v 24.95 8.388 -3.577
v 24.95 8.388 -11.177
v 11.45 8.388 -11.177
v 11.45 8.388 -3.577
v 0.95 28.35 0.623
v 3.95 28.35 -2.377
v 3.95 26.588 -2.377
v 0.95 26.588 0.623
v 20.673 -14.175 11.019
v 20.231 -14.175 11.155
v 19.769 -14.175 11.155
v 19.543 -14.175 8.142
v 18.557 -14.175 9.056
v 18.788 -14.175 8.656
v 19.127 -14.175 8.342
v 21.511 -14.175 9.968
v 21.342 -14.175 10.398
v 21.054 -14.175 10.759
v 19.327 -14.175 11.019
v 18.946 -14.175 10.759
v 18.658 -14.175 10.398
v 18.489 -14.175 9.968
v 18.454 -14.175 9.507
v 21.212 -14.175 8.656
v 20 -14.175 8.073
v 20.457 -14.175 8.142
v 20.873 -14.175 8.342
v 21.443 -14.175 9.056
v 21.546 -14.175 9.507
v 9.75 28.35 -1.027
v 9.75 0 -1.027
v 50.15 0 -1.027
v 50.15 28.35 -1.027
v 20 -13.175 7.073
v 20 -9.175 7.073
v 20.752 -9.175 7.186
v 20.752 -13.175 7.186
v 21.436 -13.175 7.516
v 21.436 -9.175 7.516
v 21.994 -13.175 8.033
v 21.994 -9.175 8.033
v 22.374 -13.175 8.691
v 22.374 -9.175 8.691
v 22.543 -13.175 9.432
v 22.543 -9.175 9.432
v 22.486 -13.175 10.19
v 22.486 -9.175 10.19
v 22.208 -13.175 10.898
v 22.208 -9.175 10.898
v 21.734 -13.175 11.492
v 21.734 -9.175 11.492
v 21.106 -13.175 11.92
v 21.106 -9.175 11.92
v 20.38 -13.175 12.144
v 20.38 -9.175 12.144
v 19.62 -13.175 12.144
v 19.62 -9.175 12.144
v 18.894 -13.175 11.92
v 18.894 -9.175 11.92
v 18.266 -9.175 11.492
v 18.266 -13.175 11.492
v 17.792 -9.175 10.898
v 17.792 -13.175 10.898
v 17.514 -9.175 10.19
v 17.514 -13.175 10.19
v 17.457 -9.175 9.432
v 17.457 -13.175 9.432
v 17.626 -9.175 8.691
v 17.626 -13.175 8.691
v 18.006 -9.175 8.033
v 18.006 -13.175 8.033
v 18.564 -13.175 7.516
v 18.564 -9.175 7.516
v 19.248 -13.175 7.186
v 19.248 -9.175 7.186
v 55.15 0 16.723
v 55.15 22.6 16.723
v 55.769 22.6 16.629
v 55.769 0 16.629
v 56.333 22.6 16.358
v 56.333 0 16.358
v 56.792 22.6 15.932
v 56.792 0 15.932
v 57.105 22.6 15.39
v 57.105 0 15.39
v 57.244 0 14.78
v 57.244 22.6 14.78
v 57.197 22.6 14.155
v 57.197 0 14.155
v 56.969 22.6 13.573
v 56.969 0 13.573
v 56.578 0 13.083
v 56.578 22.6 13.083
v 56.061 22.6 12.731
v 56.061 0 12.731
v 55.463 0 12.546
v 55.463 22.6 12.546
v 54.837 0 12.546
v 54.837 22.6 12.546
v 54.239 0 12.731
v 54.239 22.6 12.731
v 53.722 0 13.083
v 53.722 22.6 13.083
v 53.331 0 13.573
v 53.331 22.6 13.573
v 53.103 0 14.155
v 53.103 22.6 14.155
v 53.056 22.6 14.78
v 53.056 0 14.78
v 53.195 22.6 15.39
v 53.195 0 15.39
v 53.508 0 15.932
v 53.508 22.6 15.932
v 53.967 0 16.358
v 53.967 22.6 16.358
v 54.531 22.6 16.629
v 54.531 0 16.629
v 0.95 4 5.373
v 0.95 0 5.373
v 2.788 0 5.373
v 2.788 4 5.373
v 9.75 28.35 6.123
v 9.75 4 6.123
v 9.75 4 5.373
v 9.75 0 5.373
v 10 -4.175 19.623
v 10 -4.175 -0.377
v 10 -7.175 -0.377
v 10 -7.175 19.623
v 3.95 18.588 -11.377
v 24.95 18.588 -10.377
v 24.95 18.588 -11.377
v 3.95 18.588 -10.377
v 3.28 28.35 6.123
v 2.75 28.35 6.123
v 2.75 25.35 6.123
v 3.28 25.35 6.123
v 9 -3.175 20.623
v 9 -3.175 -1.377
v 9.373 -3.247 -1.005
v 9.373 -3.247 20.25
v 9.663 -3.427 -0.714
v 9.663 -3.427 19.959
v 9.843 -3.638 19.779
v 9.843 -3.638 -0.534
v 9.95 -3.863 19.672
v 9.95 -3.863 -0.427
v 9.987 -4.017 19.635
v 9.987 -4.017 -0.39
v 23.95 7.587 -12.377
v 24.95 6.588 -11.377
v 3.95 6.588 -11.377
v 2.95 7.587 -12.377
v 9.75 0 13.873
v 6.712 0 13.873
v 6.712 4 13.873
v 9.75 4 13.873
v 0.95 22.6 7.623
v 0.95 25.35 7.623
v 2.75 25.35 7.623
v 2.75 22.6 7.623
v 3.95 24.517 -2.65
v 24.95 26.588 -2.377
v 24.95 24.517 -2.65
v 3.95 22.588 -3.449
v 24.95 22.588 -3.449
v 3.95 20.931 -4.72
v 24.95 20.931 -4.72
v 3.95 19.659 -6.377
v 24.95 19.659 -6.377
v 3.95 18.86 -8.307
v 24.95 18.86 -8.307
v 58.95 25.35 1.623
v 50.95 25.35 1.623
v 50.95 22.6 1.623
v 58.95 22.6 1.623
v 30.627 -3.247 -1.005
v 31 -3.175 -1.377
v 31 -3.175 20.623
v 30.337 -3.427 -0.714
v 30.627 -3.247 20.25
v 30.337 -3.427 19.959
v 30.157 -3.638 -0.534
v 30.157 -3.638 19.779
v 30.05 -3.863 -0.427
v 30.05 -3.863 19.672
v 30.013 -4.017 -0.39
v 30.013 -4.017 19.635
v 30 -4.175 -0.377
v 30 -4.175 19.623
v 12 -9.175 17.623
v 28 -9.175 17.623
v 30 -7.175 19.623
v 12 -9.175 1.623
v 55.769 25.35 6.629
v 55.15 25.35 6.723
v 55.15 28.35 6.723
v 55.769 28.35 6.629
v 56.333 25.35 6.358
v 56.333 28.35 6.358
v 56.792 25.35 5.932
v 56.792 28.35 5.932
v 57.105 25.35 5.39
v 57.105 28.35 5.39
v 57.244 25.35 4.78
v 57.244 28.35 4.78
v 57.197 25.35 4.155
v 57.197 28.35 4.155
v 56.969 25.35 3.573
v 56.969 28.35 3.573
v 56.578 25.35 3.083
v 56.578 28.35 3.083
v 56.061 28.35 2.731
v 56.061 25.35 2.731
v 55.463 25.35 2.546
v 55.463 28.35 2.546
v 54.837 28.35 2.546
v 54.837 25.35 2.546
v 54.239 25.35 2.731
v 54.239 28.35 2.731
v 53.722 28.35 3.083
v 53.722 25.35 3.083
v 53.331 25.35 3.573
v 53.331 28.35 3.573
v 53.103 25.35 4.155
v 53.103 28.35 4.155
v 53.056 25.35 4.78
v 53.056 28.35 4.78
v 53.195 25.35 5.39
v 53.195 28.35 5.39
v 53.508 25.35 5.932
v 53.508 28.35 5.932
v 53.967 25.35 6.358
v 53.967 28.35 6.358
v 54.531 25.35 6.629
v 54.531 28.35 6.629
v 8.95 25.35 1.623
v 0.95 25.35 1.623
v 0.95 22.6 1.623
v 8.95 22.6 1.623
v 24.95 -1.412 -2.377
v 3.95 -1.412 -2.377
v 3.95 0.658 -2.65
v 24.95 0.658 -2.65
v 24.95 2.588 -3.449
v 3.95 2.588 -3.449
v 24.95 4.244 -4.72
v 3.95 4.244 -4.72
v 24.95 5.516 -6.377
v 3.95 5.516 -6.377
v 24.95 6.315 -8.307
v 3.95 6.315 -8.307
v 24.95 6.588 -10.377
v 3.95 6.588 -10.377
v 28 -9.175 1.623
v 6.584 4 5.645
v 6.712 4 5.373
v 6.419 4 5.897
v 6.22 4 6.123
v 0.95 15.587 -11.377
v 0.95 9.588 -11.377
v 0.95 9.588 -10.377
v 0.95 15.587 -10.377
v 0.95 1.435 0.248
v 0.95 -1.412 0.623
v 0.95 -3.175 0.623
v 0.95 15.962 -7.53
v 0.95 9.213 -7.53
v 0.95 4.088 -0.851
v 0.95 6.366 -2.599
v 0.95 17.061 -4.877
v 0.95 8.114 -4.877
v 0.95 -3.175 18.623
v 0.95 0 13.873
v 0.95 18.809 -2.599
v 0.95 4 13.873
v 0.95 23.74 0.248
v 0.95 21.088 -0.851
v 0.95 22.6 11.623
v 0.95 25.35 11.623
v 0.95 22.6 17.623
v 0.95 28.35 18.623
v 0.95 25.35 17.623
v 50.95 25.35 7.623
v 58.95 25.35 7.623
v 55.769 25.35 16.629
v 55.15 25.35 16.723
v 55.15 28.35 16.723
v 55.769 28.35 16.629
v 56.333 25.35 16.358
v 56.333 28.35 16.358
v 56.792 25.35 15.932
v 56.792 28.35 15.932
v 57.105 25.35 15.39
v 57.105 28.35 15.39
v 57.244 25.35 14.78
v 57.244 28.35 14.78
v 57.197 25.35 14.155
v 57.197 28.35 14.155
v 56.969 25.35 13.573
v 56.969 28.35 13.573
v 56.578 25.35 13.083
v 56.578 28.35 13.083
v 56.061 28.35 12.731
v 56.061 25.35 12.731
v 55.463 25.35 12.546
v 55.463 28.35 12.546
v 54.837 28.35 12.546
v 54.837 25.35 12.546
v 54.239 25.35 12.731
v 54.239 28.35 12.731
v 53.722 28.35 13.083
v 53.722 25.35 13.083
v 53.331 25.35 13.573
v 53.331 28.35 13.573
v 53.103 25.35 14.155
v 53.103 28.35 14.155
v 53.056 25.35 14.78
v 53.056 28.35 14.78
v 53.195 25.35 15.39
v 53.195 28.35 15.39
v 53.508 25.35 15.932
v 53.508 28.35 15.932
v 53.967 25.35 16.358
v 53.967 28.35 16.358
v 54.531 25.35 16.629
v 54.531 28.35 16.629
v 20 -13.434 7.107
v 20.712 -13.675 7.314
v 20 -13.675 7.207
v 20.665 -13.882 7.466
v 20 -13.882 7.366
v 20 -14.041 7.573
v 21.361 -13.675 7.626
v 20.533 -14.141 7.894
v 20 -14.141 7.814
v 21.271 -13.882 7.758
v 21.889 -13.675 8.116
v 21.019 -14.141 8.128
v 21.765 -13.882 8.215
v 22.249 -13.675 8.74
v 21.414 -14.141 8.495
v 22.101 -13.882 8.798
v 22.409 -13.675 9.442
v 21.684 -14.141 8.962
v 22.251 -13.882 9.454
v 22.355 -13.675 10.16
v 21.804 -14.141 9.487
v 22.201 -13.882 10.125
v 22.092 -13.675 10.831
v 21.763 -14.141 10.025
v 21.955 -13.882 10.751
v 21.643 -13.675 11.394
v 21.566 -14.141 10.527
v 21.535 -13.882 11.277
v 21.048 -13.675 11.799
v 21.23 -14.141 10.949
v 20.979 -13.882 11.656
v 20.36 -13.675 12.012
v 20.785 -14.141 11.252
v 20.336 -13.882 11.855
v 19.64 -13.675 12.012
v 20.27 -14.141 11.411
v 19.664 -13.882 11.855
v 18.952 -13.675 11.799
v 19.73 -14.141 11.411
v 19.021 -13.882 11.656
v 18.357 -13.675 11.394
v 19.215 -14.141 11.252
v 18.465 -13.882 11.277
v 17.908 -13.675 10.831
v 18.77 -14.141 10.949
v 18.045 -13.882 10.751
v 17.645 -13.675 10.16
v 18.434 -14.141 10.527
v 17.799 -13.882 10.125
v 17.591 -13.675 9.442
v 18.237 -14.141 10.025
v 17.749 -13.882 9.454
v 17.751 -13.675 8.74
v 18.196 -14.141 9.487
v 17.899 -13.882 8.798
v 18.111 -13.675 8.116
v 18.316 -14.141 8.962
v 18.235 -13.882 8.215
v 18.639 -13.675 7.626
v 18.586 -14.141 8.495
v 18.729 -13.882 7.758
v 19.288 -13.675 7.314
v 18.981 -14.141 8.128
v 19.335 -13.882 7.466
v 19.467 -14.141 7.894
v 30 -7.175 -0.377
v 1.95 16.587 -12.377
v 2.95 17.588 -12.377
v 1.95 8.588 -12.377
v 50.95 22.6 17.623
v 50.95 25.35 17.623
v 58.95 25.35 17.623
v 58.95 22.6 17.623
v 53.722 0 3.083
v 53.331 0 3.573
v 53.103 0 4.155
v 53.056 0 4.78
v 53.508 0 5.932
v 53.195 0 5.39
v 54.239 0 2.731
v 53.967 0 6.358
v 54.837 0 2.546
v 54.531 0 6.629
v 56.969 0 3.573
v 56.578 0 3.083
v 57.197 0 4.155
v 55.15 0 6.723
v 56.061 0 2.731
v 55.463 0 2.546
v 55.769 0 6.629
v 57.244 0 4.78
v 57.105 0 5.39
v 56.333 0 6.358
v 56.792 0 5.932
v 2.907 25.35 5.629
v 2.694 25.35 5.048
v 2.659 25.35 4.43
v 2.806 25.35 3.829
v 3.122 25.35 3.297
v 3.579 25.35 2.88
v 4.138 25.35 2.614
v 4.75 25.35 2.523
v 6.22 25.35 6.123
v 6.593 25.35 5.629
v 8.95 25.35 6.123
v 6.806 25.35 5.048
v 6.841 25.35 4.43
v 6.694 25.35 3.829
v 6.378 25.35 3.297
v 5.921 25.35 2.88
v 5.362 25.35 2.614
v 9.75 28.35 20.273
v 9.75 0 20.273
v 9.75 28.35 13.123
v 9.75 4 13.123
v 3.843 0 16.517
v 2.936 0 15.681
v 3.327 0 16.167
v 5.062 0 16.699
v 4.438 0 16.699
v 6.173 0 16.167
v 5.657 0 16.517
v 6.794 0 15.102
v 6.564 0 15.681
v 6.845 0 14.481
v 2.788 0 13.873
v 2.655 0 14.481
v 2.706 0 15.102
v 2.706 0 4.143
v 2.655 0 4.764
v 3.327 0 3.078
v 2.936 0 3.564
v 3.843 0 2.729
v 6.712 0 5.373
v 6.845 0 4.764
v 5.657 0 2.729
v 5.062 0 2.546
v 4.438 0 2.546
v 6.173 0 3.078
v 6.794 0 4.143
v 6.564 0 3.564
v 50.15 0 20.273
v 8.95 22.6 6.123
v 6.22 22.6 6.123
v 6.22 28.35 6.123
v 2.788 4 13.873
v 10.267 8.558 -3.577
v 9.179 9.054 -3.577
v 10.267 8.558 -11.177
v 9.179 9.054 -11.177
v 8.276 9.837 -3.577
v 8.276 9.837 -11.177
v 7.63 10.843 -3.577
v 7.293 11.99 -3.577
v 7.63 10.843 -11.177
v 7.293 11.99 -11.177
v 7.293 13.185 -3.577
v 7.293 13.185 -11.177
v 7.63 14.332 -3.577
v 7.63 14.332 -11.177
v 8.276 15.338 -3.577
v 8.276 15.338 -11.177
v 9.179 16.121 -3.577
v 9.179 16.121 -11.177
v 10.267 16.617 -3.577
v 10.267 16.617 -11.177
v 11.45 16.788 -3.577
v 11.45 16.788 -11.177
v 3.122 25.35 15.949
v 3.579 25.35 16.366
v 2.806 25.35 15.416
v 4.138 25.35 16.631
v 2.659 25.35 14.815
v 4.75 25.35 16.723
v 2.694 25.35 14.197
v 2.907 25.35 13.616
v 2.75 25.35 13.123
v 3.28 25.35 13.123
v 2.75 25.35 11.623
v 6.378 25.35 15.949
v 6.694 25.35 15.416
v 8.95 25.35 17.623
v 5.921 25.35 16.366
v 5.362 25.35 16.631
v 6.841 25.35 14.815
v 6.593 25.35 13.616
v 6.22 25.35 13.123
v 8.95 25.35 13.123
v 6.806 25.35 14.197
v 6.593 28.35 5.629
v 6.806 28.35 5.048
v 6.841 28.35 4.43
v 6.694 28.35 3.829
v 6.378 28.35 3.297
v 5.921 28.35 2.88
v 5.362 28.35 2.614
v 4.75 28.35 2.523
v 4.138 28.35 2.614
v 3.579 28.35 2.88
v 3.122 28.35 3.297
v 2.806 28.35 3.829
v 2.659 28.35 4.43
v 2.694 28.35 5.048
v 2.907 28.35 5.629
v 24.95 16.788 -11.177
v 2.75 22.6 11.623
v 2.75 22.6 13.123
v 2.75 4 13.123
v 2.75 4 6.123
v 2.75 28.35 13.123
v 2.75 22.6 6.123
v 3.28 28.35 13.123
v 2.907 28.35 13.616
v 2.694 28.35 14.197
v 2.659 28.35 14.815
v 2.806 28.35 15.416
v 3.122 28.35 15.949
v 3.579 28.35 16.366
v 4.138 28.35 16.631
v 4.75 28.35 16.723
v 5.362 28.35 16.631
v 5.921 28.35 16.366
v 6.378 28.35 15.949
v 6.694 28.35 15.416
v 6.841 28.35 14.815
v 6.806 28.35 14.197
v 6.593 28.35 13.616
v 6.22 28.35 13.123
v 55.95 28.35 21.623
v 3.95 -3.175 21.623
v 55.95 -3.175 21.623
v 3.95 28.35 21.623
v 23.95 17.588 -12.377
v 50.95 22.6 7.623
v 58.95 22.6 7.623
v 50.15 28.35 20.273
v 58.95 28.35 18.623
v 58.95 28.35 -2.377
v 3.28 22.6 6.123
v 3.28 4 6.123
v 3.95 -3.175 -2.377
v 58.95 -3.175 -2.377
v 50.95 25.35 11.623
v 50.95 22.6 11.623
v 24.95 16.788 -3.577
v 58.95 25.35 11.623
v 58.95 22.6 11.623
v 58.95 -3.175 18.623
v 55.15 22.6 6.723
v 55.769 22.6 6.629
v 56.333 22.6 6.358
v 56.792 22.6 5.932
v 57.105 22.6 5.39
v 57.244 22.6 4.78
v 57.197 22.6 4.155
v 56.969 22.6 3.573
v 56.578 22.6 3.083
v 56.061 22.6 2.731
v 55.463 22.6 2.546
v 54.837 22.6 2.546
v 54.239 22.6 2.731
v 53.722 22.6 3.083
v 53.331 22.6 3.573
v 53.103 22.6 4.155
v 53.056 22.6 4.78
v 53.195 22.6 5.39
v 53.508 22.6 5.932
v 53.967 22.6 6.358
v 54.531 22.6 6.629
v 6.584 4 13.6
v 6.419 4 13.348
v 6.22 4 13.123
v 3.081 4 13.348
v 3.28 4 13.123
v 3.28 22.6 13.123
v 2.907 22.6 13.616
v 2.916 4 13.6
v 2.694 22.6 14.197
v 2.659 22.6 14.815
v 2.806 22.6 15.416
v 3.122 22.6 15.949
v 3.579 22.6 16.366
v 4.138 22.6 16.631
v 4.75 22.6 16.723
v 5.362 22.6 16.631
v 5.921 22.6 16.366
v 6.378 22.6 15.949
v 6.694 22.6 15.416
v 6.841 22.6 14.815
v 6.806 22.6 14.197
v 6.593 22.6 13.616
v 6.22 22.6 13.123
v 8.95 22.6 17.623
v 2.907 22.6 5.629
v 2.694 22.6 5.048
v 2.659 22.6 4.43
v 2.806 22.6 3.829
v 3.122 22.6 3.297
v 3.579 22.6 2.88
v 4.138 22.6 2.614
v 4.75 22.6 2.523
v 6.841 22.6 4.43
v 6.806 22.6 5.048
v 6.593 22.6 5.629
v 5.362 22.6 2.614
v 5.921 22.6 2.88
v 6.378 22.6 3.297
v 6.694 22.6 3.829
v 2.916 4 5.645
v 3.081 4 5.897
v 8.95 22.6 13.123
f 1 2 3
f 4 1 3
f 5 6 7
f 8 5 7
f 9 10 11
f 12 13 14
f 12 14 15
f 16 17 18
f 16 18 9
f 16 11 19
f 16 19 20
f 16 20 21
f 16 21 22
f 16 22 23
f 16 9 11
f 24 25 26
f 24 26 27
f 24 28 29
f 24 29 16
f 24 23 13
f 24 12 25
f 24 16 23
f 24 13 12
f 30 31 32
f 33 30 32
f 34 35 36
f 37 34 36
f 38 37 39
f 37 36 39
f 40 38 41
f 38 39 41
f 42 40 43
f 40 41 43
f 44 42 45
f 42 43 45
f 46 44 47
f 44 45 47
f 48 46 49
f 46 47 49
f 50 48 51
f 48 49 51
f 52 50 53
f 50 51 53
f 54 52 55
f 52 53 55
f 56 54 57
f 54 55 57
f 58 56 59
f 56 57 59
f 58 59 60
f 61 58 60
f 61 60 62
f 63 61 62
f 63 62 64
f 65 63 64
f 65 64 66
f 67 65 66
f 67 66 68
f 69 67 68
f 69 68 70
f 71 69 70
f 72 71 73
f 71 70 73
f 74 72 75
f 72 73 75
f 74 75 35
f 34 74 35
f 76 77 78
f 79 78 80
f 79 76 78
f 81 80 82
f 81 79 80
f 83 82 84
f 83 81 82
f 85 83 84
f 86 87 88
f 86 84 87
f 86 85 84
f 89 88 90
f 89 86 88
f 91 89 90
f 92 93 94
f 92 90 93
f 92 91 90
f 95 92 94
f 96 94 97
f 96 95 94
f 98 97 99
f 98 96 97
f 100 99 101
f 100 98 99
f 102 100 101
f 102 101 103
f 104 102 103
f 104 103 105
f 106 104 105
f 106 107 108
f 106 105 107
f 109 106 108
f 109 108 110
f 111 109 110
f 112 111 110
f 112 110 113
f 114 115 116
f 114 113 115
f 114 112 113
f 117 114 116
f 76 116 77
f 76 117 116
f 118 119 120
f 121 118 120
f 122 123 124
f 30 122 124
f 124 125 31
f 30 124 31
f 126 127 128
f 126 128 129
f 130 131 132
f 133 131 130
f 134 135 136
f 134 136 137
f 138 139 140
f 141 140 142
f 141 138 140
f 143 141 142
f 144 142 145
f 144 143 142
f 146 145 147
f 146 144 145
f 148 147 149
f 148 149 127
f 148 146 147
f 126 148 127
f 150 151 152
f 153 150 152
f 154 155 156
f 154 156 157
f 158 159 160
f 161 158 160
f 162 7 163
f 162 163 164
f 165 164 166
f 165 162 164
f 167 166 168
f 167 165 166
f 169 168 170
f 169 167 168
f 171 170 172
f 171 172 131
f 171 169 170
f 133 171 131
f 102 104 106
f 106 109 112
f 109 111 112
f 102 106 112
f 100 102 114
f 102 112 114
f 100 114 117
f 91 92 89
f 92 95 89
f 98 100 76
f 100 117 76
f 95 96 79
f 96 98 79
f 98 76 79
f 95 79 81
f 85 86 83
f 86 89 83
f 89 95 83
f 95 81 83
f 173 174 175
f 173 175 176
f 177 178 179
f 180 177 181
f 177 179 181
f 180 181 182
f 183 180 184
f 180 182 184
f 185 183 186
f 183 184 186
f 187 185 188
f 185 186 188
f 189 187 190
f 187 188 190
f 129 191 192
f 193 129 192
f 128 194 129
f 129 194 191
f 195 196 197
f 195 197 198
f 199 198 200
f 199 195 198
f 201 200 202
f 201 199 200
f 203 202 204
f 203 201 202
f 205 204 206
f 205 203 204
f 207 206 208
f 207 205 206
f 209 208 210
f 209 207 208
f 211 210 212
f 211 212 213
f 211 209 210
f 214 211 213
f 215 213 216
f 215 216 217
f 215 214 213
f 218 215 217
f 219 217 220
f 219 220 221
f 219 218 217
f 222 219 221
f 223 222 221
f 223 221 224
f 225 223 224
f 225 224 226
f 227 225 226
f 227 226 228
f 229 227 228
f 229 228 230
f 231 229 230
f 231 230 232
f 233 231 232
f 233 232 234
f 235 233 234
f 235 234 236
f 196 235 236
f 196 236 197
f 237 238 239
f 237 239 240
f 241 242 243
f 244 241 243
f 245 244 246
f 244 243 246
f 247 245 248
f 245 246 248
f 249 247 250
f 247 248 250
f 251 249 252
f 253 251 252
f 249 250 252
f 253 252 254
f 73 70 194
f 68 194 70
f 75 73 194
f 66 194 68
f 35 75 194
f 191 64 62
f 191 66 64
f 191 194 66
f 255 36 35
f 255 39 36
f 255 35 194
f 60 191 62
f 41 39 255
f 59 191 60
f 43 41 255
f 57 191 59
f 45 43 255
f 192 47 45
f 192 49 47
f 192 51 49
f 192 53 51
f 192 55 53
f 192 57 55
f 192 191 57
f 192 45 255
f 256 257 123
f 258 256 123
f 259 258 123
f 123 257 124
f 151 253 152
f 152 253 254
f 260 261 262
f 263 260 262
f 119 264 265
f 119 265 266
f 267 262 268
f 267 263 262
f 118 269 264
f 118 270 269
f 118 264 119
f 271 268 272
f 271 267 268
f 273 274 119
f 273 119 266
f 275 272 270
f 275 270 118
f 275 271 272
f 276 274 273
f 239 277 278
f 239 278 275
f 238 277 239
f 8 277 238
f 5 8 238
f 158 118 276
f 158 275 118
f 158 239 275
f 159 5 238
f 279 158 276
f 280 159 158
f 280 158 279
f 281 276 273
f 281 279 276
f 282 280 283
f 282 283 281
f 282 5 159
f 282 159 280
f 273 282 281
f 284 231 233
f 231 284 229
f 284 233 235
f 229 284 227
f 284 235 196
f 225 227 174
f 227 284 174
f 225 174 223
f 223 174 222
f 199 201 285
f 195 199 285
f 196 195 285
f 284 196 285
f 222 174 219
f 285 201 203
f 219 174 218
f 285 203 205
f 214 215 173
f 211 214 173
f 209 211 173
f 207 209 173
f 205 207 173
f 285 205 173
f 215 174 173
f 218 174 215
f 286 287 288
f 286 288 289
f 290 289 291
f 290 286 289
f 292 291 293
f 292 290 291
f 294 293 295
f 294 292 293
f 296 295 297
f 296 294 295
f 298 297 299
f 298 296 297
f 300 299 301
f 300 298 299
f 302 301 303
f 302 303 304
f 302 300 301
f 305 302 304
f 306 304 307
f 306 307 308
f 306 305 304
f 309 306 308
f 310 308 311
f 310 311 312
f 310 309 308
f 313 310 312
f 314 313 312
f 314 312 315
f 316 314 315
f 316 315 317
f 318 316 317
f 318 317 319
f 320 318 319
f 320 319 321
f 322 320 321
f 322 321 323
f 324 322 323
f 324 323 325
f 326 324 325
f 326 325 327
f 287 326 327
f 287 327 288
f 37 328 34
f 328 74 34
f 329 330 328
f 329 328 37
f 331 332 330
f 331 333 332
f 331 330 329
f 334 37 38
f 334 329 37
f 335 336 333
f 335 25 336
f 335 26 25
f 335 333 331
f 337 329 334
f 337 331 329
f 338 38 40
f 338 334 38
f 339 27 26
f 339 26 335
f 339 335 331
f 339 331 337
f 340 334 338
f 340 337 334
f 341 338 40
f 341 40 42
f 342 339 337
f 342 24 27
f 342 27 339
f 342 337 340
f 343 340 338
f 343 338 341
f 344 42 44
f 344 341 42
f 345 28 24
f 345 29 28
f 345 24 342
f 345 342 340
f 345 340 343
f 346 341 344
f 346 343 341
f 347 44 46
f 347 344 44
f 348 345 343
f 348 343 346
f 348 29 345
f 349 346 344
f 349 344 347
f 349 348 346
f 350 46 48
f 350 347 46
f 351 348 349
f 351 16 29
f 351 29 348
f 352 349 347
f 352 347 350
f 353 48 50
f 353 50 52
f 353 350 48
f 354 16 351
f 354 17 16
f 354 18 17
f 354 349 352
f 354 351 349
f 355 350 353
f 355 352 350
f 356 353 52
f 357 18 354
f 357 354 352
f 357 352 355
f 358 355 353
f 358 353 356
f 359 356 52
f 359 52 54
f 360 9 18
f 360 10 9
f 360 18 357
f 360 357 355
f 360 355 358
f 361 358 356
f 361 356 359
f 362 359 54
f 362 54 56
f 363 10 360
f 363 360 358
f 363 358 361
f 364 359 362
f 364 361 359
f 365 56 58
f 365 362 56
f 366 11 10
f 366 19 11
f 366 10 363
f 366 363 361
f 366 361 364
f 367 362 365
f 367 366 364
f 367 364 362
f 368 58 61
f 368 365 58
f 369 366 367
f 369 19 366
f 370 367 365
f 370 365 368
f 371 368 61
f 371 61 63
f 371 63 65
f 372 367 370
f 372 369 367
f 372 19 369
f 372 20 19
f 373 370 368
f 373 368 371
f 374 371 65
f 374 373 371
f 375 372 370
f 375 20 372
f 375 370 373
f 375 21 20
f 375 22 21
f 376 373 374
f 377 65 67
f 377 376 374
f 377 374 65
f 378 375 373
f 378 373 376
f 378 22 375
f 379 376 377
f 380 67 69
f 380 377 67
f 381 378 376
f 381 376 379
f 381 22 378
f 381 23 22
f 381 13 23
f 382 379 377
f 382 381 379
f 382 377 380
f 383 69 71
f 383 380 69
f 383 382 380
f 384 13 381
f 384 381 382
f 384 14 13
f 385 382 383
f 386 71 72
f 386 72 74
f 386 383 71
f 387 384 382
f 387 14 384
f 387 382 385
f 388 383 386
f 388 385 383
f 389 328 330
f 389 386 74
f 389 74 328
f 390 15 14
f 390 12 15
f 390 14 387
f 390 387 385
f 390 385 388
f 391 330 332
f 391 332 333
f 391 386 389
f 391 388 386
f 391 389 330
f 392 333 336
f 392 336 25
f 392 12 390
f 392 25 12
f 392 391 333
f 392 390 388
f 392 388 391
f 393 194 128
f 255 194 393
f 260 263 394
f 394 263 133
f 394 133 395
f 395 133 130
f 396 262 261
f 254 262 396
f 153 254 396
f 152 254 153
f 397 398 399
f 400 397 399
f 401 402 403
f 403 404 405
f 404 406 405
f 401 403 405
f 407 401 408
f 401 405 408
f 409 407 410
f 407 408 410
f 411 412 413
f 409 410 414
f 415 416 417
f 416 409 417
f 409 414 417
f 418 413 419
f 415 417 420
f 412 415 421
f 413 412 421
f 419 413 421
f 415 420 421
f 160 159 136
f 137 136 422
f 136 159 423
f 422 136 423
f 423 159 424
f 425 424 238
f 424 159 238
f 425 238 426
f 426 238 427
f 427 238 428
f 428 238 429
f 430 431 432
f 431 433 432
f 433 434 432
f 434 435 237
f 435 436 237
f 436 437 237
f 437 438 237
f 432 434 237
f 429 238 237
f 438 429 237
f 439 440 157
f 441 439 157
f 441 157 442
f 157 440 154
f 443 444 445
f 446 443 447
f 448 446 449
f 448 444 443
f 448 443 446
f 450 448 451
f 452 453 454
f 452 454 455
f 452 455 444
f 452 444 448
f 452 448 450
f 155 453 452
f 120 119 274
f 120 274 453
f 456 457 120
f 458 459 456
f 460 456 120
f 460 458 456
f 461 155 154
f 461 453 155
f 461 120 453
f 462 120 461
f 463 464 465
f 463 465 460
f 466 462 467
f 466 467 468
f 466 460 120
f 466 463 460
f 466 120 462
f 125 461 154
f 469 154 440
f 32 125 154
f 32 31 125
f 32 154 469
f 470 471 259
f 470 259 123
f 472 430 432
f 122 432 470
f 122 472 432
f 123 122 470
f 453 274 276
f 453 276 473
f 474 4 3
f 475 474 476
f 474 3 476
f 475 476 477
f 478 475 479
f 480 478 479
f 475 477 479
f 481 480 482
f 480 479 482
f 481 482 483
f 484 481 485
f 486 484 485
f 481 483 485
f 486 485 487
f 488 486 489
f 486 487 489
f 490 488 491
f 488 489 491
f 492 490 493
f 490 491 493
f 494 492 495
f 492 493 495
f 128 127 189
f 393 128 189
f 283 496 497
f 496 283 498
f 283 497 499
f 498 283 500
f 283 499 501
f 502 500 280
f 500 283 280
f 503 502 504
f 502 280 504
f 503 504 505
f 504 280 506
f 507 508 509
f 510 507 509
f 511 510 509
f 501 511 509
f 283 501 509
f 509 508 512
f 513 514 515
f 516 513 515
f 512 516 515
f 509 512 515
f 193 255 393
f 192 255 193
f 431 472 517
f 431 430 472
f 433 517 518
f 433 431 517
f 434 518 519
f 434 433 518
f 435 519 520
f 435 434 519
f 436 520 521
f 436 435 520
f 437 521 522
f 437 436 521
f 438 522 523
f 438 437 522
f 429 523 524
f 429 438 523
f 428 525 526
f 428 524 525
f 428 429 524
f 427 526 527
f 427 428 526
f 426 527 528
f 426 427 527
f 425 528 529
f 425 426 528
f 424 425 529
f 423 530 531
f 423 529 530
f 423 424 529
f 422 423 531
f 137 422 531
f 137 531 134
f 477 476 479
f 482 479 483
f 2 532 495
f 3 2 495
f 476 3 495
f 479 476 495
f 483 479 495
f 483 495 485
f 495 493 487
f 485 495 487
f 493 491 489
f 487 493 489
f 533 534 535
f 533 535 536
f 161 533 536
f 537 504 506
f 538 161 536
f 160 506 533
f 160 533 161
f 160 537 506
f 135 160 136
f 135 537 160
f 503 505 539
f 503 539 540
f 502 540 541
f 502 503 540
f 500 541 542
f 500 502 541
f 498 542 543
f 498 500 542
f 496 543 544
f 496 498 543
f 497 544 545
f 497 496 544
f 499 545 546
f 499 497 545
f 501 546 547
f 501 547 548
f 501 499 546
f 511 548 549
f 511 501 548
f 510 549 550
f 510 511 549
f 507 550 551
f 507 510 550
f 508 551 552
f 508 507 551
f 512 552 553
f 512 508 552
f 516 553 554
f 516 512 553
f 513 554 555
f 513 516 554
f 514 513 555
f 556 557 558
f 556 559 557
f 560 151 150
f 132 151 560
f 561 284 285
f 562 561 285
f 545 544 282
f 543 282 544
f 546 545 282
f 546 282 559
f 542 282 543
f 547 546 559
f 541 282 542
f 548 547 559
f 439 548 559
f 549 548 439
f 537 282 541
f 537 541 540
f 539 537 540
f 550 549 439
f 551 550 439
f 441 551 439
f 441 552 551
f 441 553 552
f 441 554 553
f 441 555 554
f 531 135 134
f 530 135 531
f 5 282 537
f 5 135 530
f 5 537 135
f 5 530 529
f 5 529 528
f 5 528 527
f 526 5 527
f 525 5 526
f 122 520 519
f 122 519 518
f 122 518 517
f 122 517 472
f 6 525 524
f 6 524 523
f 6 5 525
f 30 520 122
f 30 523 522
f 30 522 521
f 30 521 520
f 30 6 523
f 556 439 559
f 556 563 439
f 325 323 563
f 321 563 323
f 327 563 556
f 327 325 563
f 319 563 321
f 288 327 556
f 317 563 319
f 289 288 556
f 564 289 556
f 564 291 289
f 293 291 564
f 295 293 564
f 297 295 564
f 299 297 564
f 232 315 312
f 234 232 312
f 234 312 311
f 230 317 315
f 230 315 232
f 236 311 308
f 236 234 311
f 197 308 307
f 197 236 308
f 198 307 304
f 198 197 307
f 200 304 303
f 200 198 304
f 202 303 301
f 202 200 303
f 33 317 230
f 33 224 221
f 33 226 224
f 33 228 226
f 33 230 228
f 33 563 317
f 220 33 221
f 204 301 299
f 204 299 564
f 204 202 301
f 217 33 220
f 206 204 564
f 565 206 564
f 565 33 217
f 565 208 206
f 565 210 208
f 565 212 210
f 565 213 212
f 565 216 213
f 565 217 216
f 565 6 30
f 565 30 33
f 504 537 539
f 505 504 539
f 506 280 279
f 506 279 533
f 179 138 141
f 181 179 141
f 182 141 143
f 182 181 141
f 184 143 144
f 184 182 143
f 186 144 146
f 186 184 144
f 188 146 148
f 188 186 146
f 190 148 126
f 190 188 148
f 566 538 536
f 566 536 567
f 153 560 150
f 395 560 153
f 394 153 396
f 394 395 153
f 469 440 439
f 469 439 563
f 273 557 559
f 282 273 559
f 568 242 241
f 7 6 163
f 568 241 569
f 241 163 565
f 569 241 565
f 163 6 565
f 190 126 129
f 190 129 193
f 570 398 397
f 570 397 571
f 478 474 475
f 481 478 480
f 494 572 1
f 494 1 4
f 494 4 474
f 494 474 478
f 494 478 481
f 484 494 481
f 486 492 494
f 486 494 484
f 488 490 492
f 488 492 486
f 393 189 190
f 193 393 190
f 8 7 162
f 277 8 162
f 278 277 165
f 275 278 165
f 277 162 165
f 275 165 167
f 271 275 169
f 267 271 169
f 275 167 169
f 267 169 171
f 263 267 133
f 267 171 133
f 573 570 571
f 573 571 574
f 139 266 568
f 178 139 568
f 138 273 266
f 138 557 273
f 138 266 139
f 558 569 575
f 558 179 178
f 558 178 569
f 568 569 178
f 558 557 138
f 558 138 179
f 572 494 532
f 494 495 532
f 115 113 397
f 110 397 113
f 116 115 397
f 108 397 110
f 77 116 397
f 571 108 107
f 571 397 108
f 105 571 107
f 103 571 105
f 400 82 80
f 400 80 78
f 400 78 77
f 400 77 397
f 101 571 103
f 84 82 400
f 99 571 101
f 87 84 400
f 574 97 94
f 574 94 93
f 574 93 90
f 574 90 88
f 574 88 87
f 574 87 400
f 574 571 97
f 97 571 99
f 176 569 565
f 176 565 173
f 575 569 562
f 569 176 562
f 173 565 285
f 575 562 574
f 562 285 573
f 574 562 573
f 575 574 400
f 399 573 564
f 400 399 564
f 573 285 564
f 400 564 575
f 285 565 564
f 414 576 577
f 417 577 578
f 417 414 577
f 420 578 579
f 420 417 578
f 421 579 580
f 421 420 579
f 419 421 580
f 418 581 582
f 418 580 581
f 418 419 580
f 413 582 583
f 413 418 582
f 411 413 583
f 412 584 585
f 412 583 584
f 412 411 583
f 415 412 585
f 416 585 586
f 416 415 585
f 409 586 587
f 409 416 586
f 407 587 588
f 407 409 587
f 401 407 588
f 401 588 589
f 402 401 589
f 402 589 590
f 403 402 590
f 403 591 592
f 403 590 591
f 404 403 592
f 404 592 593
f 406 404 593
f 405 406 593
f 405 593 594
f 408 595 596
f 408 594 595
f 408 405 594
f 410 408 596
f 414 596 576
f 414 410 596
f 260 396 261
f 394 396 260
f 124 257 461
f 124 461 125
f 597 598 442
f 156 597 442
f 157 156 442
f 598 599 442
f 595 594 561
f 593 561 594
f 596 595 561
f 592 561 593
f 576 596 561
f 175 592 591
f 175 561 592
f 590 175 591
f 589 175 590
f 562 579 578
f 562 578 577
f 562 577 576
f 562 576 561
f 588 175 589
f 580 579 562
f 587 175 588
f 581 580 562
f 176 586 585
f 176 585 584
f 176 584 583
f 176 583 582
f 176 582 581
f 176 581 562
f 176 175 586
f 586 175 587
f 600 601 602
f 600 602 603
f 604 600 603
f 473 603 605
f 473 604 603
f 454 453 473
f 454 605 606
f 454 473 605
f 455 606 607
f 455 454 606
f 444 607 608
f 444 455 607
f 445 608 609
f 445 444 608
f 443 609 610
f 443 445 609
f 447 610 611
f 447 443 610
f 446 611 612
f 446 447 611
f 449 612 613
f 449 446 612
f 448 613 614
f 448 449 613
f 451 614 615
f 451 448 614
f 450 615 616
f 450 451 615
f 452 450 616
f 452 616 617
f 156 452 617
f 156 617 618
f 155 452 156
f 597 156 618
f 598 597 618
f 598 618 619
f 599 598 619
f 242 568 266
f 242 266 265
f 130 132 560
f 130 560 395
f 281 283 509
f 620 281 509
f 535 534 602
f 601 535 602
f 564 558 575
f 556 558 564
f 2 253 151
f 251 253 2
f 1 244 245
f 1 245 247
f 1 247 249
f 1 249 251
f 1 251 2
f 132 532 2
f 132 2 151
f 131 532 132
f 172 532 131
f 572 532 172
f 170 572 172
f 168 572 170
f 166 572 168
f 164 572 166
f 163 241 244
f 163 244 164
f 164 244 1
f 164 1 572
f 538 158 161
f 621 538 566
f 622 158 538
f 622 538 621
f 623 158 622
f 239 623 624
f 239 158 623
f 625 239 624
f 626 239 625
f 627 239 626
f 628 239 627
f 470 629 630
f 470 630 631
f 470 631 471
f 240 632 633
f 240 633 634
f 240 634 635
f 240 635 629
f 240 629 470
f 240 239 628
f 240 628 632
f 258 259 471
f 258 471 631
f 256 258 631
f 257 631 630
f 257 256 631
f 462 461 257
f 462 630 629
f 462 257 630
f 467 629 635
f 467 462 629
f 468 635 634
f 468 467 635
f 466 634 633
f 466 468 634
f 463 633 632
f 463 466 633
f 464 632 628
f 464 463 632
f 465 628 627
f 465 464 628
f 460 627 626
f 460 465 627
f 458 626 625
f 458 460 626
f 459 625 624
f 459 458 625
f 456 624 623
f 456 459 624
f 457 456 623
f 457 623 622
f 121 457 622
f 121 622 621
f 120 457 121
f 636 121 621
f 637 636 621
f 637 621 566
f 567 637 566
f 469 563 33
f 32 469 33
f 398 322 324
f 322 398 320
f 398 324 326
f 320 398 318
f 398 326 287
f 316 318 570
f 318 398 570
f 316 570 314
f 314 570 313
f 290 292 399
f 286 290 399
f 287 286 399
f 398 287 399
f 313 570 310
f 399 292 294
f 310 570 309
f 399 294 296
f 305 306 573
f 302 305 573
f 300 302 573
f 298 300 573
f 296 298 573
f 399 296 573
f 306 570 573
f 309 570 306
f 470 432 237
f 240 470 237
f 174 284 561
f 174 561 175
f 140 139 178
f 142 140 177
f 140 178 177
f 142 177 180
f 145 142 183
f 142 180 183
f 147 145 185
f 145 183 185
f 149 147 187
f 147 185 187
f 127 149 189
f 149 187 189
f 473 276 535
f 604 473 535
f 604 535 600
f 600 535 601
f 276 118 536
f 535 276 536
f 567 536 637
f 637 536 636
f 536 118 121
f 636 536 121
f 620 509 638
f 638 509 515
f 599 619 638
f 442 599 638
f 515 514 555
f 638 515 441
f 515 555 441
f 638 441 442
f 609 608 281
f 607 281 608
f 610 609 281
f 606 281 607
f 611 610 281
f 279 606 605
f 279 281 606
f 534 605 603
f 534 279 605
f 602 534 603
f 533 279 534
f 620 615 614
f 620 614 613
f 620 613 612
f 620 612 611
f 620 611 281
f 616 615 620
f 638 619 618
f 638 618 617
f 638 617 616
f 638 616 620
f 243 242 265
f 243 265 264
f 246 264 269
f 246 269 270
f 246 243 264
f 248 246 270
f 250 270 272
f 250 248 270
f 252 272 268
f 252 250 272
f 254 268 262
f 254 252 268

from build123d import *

# Parameters (mm, degrees)
SKETCH1_W           = 58
SKETCH1_H           = 24
SKETCH1_R           = 2.1
SKETCH1_W_2         = 40.4
SKETCH1_H_2         = 21.3
BOSS_EXTRUDE1_DEPTH = 28.35
SKETCH11_W          = 58
SKETCH11_H          = 24
BOSS_EXTRUDE5_DEPTH = 3.175
SKETCH14_W          = 24
SKETCH14_H          = 12
BOSS_EXTRUDE7_DEPTH = 10
CUT_EXTRUDE1_DEPTH  = 3.8
FILLET1_R           = 8
CHAMFER2_SIZE       = 3
CHAMFER3_SIZE       = 1
SKETCH19_W          = 8
SKETCH19_H          = 6
CUT_EXTRUDE3_DEPTH  = 2.75
SKETCH20_W          = 8.8
SKETCH20_H          = 8.5
CUT_EXTRUDE4_DEPTH  = 4
SKETCH21_W          = 20
SKETCH21_H          = 20
BOSS_EXTRUDE8_DEPTH = 6
SKETCH13_R          = 2.55
BOSS_EXTRUDE6_DEPTH = 5
FILLET4_R           = 1
CHAMFER4_SIZE       = 2
FILLET5_R           = 1
CUT_EXTRUDE5_REACH  = 77.835
SKETCH22_W          = 7
SKETCH22_H          = 7


with BuildPart() as part:
    # Sketch1 → Boss-Extrude1 (new body)
    with BuildSketch(Plane(origin=(0, 0, 0), x_dir=(1, 0, 0), z_dir=(0, 1, 0))):
        with Locations((29.95, -9.622651473)):
            Rectangle(SKETCH1_W, SKETCH1_H)
        with Locations(Location((55.15, -4.622651473, 0), (0, 0, 270))):
            Circle(SKETCH1_R, mode=Mode.SUBTRACT)
        with Locations(Location((55.15, -14.622651473, 0), (0, 0, 270))):
            Circle(SKETCH1_R, mode=Mode.SUBTRACT)
        with Locations(Location((4.75, -14.622651473, 0), (0, 0, 90))):
            Circle(SKETCH1_R, mode=Mode.SUBTRACT)
        with Locations(Location((4.75, -4.622651473, 0), (0, 0, 90))):
            Circle(SKETCH1_R, mode=Mode.SUBTRACT)
        with Locations((29.95, -9.622651473)):
            Rectangle(SKETCH1_W_2, SKETCH1_H_2, mode=Mode.SUBTRACT)
    extrude(amount=BOSS_EXTRUDE1_DEPTH)

    # Sketch11 → Boss-Extrude5 (add)
    with BuildSketch(Plane.XZ):
        with Locations((29.95, 9.622651473)):
            Rectangle(SKETCH11_W, SKETCH11_H)
    extrude(amount=BOSS_EXTRUDE5_DEPTH)

    # Sketch14 → Boss-Extrude7 (add)
    with BuildSketch(Plane(origin=(0, 0, -2.377348527), x_dir=(-1, 0, 0), z_dir=(0, 0, -1))):
        with Locations((-12.95, 12.5875)):
            Rectangle(SKETCH14_W, SKETCH14_H)
    extrude(amount=BOSS_EXTRUDE7_DEPTH)

    # Sketch16 → Cut-Extrude1 (cut, symmetric)
    with BuildSketch(Plane(origin=(0, 0, -7.377348527), x_dir=(-1, 0, 0), z_dir=(0, 0, -1))):
        with BuildLine():
            Line((-11.45, 16.7875), (-24.95, 16.7875))
            Line((-24.95, 16.7875), (-24.95, 8.3875))
            Line((-24.95, 8.3875), (-11.45, 8.3875))
            ThreePointArc((-11.45, 8.3875), (-7.25, 12.5875), (-11.45, 16.7875))
        make_face()
    extrude(amount=CUT_EXTRUDE1_DEPTH, both=True, mode=Mode.SUBTRACT)

    # Fillet1
    fillet1_edges = [part.edges().sort_by_distance(p)[0] for p in [
        (12.95, 6.5875, -2.377348527),
        (12.95, 18.5875, -2.377348527),
    ]]
    fillet(fillet1_edges, radius=FILLET1_R)

    # Chamfer2
    chamfer2_edges = [part.edges().sort_by_distance(p)[0] for p in [
        (0.95, 6.5875, -11.377348527),
        (0.95, 18.5875, -11.377348527),
        (58.95, 12.5875, 21.622651473),
        (0.95, 12.5875, 21.622651473),
        (0.95, 27.46875, -2.377348527),
        (0.95, -2.29375, -2.377348527),
        (0.95, 4.244354249, -4.720494277),
        (0.95, 20.930645751, -4.720494277),
    ]]
    chamfer(chamfer2_edges, length=CHAMFER2_SIZE)

    # Chamfer3
    chamfer3_edges = [part.edges().sort_by_distance(p)[0] for p in [
        (0.95, 12.5875, -12.377348527),
        (14.45, 18.5875, -12.377348527),
        (24.95, 12.5875, -12.377348527),
        (14.45, 6.5875, -12.377348527),
    ]]
    chamfer(chamfer3_edges, length=CHAMFER3_SIZE)

    # Sketch19 → Cut-Extrude3 (cut)
    with BuildSketch(Plane(origin=(0, 25.35, 0), x_dir=(1, 0, 0), z_dir=(0, 1, 0))):
        with Locations((4.95, -4.622651473)):
            Rectangle(SKETCH19_W, SKETCH19_H)
        with Locations((4.95, -14.622651473)):
            Rectangle(SKETCH19_W, SKETCH19_H)
        with Locations((54.95, -14.622651473)):
            Rectangle(SKETCH19_W, SKETCH19_H)
        with Locations((54.95, -4.622651473)):
            Rectangle(SKETCH19_W, SKETCH19_H)
    extrude(amount=-CUT_EXTRUDE3_DEPTH, mode=Mode.SUBTRACT)

    # Sketch20 → Cut-Extrude4 (cut)
    with BuildSketch(Plane(origin=(0, 0, 0), x_dir=(1, 0, 0), z_dir=(0, 1, 0))):
        with Locations((5.35, -9.622651473)):
            Rectangle(SKETCH20_W, SKETCH20_H)
    extrude(amount=CUT_EXTRUDE4_DEPTH, mode=Mode.SUBTRACT)

    # Sketch21 → Boss-Extrude8 (add)
    with BuildSketch(Plane.XZ.offset(3.175)):
        with Locations((20, 9.622651473)):
            Rectangle(SKETCH21_W, SKETCH21_H)
    extrude(amount=BOSS_EXTRUDE8_DEPTH)

    # Sketch13 → Boss-Extrude6 (add)
    with BuildSketch(Plane.XZ.offset(9.175)):
        with Locations(Location((20, 9.622651473, 0), (0, 0, 270))):
            Circle(SKETCH13_R)
    extrude(amount=BOSS_EXTRUDE6_DEPTH)

    # Fillet4
    fillet4_edges = [part.edges().sort_by_distance(p)[0] for p in [
        (10, -3.175, 9.622651473),
        (20, -3.175, -0.377348527),
        (30, -3.175, 9.622651473),
        (20, -3.175, 19.622651473),
    ]]
    fillet(fillet4_edges, radius=FILLET4_R)

    # Chamfer4
    chamfer4_edges = [part.edges().sort_by_distance(p)[0] for p in [
        (10, -9.175, 9.622651473),
        (20, -9.175, -0.377348527),
        (30, -9.175, 9.622651473),
        (20, -9.175, 19.622651473),
    ]]
    chamfer(chamfer4_edges, length=CHAMFER4_SIZE)

    # Fillet5
    fillet5_edges = [part.edges().sort_by_distance(p)[0] for p in [
        (20, -14.175, 12.172651473),
    ]]
    fillet(fillet5_edges, radius=FILLET5_R)

    # Cut-Extrude5: up to this face of the body (flat: up to its plane)
    cut_extrude5_end = Plane(part.part.faces().sort_by_distance((55.15, 0, 14.622651473))[0])
    # Sketch22 → Cut-Extrude5 (cut, up to the picked face)
    with BuildSketch(Plane(origin=(0, 28.35, 0), x_dir=(1, 0, 0), z_dir=(0, 1, 0)), mode=Mode.PRIVATE) as cut_extrude5_sk1:
        with Locations((6.25, -9.622651473)):
            Rectangle(SKETCH22_W, SKETCH22_H)
    cut_extrude5_tool1 = split(extrude(cut_extrude5_sk1.sketch, amount=-CUT_EXTRUDE5_REACH, mode=Mode.PRIVATE), bisect_by=cut_extrude5_end, keep=Keep.BOTH, mode=Mode.PRIVATE)
    add(cut_extrude5_tool1.solids().sort_by(Axis((6.25, 28.35, 9.622651), (0, -1, 0)))[0], mode=Mode.SUBTRACT)


solid = part.part
